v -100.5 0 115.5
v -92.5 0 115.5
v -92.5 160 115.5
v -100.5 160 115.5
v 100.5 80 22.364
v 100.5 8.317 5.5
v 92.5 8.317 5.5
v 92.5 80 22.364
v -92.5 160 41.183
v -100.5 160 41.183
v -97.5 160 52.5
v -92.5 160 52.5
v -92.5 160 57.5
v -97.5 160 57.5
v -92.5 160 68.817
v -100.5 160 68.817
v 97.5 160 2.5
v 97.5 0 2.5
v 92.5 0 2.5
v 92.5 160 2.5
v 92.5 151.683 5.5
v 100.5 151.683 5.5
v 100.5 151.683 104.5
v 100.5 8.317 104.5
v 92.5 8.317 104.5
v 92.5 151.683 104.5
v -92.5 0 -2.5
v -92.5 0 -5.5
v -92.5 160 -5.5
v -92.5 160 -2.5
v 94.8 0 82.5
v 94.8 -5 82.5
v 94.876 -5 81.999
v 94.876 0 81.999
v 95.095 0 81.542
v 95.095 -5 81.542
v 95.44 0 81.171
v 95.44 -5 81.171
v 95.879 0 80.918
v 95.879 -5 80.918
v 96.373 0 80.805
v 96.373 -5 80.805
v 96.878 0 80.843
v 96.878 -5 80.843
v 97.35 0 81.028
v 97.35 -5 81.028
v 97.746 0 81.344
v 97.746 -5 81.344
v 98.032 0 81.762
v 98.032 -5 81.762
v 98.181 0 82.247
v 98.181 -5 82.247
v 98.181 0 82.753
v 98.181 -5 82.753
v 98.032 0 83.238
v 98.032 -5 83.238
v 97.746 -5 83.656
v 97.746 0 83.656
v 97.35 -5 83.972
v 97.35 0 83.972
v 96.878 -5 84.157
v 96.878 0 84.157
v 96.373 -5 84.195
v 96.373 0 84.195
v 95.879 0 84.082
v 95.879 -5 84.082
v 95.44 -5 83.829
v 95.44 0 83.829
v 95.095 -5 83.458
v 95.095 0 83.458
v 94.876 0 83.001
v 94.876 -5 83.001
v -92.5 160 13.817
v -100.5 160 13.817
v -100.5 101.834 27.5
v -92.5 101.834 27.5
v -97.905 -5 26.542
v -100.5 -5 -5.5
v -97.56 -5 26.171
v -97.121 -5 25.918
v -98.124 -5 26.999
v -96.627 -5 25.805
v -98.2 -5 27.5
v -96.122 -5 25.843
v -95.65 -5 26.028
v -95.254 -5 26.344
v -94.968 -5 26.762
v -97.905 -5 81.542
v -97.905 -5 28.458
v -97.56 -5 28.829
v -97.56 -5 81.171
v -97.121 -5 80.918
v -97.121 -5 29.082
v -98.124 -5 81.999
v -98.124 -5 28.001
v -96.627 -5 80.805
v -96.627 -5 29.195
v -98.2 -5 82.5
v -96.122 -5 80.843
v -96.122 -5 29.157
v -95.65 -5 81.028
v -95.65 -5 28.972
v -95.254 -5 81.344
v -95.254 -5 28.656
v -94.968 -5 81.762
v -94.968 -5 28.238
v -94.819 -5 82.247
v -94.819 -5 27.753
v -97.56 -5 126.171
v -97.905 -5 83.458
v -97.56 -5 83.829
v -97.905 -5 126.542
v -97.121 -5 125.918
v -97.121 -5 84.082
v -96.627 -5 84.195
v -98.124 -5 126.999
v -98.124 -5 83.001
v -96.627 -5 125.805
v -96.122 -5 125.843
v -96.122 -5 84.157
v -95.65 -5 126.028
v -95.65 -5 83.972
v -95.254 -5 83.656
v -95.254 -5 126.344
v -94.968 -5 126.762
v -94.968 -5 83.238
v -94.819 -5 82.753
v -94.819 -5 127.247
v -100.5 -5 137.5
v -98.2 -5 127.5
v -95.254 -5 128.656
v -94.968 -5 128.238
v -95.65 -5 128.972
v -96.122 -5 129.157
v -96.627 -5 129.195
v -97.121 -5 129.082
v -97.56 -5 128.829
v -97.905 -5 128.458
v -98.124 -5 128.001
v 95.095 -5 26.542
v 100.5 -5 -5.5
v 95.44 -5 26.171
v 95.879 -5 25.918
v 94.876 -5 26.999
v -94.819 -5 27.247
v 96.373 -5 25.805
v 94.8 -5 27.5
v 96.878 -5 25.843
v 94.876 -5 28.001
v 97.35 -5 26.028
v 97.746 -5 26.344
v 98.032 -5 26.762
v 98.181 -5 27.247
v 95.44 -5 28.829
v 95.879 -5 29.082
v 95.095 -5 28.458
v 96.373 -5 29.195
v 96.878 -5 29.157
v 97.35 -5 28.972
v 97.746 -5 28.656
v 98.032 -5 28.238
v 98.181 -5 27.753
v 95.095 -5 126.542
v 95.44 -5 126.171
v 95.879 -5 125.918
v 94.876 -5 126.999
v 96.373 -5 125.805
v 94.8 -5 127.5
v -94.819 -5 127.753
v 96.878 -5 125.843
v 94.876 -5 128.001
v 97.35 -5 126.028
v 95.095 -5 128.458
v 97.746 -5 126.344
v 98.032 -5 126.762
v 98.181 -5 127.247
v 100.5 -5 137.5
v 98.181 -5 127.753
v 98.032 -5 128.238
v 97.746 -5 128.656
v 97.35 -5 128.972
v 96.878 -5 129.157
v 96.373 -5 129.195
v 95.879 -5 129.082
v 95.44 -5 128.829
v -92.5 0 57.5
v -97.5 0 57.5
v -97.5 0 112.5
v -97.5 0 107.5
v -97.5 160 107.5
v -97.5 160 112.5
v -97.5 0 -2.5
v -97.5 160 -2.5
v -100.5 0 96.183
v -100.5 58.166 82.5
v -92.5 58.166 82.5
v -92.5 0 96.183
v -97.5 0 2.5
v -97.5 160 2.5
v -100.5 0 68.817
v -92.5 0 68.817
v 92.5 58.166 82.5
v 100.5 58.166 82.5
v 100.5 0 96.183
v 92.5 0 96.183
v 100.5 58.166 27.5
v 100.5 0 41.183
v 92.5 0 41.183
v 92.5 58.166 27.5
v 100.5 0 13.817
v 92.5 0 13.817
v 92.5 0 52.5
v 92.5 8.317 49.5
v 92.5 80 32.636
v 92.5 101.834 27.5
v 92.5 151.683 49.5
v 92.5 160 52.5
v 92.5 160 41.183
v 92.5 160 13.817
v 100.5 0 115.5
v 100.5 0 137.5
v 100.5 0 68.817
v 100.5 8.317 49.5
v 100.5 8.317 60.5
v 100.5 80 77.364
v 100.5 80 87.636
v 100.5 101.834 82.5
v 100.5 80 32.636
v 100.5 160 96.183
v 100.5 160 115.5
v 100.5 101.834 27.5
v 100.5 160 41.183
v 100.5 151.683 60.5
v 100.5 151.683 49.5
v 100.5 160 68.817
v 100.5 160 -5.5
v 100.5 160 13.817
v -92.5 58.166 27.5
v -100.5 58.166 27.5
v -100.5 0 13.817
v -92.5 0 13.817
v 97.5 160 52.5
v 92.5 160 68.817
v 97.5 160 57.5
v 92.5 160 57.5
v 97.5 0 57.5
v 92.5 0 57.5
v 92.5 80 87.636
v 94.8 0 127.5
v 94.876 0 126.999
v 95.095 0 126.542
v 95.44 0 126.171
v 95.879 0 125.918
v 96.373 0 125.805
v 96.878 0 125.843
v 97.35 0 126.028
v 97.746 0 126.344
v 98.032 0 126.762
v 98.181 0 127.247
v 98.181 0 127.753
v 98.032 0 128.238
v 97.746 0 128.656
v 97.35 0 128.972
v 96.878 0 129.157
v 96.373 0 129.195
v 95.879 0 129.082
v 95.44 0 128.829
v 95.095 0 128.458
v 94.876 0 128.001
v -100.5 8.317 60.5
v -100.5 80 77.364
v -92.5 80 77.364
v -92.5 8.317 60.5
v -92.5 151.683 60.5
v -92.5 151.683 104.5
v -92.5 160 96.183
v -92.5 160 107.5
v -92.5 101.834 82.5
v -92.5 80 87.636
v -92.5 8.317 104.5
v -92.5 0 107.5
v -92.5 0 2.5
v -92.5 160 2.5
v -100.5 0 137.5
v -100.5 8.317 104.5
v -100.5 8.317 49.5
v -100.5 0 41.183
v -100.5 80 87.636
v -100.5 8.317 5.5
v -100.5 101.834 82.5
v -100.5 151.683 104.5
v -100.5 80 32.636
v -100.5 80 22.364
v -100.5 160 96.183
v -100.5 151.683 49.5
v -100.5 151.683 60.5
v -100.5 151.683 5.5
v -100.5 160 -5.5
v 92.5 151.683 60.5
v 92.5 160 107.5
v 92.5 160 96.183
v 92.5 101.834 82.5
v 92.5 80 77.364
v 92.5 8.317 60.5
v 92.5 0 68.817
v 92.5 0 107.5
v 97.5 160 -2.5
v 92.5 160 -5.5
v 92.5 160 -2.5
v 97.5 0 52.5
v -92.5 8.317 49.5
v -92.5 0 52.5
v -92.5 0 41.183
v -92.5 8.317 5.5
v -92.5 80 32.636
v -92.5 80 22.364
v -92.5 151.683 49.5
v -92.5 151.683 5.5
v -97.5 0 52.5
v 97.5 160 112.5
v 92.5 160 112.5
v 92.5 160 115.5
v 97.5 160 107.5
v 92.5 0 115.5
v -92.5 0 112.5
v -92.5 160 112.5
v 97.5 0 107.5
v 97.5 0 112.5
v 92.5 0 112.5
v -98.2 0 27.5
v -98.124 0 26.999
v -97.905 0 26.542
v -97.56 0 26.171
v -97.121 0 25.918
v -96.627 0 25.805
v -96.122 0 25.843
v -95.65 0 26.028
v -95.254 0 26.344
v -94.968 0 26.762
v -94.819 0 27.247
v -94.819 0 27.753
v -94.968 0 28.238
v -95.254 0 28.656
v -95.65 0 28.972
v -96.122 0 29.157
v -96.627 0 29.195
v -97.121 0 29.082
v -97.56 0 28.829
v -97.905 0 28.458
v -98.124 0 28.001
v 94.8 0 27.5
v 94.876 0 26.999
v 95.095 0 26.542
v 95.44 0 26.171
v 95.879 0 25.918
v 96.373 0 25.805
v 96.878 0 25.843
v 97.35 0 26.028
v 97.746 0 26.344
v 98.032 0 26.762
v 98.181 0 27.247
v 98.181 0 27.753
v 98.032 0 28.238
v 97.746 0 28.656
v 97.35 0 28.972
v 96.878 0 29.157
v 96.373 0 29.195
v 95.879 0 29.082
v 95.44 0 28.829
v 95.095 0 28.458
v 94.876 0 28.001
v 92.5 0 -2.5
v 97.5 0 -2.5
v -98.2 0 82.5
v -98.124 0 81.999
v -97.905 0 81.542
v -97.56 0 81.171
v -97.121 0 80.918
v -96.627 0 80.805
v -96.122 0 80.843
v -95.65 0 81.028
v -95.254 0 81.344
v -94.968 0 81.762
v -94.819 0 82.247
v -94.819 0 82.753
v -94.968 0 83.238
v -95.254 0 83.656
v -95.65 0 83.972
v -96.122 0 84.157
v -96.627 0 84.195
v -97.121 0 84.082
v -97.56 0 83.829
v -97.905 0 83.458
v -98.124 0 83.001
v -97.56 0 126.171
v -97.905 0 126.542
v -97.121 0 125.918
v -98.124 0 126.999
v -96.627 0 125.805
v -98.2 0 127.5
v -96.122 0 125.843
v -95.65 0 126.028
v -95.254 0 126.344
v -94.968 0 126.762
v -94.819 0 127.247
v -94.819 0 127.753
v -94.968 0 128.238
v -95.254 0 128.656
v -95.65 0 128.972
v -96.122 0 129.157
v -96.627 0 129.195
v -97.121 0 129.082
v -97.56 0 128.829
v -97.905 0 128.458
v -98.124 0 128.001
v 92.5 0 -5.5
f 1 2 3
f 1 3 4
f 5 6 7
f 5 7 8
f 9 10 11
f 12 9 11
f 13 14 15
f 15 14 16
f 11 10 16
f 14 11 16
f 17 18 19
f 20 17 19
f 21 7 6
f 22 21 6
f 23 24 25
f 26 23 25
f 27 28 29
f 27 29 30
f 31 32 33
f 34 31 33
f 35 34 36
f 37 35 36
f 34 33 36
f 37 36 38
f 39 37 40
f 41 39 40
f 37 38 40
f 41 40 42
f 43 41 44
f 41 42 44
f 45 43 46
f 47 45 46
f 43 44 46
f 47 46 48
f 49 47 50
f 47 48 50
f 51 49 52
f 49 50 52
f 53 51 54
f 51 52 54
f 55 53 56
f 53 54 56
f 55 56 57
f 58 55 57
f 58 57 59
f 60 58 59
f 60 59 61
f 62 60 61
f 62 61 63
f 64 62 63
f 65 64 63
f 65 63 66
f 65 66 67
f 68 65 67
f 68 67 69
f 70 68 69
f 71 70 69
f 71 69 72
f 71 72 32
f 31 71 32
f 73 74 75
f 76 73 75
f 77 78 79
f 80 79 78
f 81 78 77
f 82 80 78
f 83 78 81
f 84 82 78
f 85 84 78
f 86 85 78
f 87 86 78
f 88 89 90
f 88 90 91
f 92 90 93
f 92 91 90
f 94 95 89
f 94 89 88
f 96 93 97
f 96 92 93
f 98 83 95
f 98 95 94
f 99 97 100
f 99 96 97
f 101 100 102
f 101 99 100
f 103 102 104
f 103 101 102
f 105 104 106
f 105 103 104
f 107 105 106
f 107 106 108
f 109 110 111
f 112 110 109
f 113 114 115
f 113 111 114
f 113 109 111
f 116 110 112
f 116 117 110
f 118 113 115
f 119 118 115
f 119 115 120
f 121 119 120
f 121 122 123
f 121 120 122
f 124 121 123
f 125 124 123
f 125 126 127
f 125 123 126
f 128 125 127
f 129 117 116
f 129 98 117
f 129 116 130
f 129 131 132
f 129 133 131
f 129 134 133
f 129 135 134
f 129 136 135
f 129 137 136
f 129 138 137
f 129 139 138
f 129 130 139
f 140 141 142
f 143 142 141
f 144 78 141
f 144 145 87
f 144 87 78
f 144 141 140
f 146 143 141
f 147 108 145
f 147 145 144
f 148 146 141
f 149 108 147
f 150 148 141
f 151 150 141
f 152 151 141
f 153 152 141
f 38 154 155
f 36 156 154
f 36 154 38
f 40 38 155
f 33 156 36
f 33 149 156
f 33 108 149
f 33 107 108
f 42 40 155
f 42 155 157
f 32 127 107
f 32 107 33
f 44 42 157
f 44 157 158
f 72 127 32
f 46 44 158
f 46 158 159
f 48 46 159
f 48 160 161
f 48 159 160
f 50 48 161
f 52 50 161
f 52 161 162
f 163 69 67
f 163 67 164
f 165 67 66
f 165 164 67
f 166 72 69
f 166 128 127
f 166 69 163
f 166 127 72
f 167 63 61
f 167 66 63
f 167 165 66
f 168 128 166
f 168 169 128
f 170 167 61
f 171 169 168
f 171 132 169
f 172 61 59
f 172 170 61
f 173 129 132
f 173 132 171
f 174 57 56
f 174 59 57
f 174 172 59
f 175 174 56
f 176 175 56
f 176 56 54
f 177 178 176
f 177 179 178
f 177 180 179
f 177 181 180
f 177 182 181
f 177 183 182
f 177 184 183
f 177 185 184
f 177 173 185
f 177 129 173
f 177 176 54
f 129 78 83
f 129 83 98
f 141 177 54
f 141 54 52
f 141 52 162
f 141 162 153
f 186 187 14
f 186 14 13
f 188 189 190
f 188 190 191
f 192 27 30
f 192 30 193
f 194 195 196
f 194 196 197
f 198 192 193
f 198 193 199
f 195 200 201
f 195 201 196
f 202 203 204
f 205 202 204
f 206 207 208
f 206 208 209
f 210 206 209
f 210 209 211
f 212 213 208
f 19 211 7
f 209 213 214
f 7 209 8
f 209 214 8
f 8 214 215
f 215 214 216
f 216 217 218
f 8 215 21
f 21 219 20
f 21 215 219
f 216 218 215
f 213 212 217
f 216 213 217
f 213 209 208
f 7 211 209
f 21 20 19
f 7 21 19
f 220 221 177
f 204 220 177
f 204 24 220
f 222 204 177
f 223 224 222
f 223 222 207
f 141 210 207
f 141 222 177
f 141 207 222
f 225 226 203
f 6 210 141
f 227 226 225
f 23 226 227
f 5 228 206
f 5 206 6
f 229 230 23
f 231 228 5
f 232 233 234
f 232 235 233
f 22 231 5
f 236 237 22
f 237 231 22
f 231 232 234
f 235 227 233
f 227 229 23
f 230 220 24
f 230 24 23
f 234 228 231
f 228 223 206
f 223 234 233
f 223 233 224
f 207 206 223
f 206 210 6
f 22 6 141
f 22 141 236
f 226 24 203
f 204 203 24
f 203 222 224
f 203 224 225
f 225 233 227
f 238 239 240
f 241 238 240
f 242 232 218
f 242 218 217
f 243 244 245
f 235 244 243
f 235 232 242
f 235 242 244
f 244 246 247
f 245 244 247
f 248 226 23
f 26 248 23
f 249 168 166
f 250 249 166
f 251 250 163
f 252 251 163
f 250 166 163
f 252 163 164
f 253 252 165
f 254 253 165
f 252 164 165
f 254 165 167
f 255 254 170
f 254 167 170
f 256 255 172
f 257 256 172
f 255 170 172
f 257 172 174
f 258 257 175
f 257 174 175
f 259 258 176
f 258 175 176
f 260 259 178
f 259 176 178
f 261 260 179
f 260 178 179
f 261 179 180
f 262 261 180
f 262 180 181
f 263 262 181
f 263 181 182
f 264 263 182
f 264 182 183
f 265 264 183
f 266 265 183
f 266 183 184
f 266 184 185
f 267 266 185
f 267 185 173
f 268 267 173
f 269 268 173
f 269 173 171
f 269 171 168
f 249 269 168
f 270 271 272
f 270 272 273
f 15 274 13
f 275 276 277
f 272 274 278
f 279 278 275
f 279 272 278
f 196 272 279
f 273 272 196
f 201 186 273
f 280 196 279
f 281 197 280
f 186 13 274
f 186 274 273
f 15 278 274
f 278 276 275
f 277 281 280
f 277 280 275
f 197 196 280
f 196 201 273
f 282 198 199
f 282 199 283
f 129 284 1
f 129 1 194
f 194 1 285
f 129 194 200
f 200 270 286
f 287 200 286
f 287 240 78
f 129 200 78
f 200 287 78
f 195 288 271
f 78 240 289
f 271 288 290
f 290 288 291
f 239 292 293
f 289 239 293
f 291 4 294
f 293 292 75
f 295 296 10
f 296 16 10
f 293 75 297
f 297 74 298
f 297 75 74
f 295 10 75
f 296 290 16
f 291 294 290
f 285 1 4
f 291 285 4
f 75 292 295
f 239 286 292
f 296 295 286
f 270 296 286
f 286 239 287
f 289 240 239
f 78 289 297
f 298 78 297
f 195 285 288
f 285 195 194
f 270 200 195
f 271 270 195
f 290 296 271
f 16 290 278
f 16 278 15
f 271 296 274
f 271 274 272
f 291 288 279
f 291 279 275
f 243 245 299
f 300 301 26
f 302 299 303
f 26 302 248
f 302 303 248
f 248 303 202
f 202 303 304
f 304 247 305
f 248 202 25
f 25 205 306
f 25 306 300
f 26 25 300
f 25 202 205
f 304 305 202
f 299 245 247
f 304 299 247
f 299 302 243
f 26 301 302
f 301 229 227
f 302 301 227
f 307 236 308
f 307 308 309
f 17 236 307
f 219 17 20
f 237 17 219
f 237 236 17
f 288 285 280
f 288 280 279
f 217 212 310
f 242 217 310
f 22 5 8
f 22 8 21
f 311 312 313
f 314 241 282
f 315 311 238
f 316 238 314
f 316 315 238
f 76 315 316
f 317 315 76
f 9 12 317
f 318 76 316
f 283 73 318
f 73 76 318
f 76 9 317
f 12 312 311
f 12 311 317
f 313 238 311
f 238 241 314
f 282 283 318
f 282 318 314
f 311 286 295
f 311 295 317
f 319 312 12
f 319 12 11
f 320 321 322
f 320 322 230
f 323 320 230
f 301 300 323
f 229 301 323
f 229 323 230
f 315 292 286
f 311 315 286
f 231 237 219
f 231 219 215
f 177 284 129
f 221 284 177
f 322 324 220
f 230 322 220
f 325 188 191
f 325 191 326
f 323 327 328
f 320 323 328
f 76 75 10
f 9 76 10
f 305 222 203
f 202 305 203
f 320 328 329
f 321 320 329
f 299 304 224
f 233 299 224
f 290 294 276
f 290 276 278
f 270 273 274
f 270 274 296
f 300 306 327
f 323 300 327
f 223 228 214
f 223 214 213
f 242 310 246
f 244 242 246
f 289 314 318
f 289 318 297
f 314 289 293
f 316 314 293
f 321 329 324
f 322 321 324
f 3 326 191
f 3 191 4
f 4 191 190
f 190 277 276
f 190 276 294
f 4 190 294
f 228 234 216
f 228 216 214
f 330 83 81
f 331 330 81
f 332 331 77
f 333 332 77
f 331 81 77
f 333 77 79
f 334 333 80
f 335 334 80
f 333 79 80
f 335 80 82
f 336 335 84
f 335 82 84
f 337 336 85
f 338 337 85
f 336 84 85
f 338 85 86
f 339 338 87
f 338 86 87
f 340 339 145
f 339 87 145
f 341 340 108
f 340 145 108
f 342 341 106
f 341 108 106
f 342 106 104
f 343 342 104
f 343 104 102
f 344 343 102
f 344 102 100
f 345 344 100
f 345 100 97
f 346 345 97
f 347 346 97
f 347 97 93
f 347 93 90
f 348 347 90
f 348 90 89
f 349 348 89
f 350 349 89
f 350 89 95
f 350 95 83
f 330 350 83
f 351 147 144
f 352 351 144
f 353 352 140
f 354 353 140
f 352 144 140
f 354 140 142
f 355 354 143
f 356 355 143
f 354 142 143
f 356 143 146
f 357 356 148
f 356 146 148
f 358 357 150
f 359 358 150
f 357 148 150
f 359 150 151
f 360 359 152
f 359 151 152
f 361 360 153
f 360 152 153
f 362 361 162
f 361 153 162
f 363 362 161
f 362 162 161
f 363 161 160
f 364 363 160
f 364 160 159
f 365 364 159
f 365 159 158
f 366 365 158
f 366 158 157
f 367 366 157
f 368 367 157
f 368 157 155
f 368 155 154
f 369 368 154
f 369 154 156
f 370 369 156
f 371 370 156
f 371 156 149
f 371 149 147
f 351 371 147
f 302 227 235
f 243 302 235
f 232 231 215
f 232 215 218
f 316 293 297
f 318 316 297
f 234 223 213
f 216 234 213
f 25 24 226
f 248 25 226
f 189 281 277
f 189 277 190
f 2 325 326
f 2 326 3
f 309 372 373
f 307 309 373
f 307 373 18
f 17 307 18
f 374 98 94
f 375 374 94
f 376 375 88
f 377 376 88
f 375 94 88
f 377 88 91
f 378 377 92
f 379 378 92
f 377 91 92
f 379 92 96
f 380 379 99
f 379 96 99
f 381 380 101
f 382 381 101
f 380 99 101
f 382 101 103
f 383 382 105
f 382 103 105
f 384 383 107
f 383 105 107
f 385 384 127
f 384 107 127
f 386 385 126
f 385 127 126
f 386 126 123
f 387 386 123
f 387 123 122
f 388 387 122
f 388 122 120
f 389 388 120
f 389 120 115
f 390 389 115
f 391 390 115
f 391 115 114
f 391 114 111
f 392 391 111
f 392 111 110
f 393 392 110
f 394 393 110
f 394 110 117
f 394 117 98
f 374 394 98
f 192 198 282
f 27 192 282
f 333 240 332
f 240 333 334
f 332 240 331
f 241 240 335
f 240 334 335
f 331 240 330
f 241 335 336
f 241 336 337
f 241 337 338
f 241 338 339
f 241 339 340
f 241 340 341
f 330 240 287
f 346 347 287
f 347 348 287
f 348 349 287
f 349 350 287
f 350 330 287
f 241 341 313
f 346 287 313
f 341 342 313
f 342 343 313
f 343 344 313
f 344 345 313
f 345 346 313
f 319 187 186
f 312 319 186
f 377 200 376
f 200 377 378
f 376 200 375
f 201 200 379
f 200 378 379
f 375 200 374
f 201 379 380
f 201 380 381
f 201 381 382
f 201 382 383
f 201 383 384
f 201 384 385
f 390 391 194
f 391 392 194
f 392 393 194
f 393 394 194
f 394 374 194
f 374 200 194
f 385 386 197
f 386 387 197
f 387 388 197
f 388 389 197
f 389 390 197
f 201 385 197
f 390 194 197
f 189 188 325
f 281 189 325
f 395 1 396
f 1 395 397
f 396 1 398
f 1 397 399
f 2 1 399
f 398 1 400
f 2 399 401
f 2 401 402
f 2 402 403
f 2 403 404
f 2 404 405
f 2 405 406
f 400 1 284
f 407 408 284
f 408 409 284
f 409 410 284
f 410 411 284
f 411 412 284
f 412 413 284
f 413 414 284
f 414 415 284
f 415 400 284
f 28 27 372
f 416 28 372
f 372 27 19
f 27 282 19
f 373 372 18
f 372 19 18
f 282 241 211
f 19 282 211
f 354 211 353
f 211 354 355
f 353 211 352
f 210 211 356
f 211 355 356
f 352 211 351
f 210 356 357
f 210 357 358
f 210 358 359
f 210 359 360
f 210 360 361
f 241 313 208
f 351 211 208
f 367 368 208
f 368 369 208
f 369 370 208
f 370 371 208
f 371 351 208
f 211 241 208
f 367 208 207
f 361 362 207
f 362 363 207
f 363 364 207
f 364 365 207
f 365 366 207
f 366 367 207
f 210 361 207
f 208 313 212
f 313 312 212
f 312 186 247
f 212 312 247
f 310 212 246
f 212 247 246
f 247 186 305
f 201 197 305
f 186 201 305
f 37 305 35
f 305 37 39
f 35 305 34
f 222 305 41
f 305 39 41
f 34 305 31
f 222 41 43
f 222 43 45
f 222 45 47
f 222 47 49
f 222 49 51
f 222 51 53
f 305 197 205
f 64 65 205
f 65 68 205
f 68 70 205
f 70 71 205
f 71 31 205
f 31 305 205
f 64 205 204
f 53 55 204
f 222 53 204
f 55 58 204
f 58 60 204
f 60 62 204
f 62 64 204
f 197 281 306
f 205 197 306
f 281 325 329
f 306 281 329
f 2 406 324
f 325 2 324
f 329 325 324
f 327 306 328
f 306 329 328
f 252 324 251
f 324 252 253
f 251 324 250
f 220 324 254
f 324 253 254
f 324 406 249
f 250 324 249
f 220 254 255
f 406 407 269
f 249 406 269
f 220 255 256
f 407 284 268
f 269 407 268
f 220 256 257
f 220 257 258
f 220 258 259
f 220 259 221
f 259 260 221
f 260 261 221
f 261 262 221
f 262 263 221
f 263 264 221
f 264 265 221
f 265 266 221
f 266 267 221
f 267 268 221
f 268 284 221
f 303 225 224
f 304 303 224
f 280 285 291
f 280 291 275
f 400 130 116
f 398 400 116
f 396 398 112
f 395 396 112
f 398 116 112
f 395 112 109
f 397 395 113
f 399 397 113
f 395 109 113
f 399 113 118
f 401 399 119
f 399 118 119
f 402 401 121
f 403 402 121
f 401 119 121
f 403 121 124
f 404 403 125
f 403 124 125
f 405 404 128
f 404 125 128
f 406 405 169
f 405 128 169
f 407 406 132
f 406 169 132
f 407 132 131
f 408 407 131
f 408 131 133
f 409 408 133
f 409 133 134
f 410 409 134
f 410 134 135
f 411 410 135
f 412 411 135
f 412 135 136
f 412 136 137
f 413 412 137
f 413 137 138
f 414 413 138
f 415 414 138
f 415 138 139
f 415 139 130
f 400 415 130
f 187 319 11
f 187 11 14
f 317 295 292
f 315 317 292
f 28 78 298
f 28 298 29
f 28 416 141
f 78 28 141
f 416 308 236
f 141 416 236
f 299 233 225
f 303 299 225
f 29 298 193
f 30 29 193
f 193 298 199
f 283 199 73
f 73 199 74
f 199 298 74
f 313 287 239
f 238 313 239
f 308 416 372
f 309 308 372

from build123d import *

# Parameters (mm, degrees)
BOSS_EXTRUDE1_DEPTH      = 160
BOSS_EXTRUDE1_2_DEPTH    = 160
LPATTERN1_COUNT          = 3
LPATTERN1_PITCH          = 55
SKETCH2_W                = 201
SKETCH2_H                = 143
BOSS_EXTRUDE2_DEPTH      = 5
BOSS_EXTRUDE3_DEPTH      = 8
M3_CLEARANCE_HOLE1_D     = 3.4
M3_CLEARANCE_HOLE1_DEPTH = 5


with BuildPart() as part:
    # Sketch1 → Boss-Extrude1 (new body)
    with BuildSketch(Plane(origin=(0, 0, 0), x_dir=(1, 0, 0), z_dir=(0, 1, 0))):
        Polygon((-100.5, 5.5), (-92.5, 5.5), (-92.5, 2.5), (-97.5, 2.5), (-97.5, -2.5), (-92.5, -2.5), (-92.5, -5.5), (-100.5, -5.5), align=None)
    boss_extrude1 = extrude(amount=BOSS_EXTRUDE1_DEPTH)



with BuildPart() as body_2:
    # Sketch1 → Boss-Extrude1 2 (new body)
    with BuildSketch(Plane(origin=(0, 0, 0), x_dir=(1, 0, 0), z_dir=(0, 1, 0))):
        Polygon((100.5, -5.5), (100.5, 5.5), (92.5, 5.5), (92.5, 2.5), (97.5, 2.5), (97.5, -2.5), (92.5, -2.5), (92.5, -5.5), align=None)
    boss_extrude1_2 = extrude(amount=BOSS_EXTRUDE1_2_DEPTH)


with BuildPart() as lpattern1_1:
    # LPattern1: pattern copy
    add(boss_extrude1.moved(Location(Vector(0, 0, 1) * (1 * LPATTERN1_PITCH))))


with BuildPart() as lpattern1_2:
    # LPattern1: pattern copy
    add(boss_extrude1.moved(Location(Vector(0, 0, 1) * (2 * LPATTERN1_PITCH))))


with BuildPart() as lpattern1_3:
    # LPattern1: pattern copy
    add(boss_extrude1_2.moved(Location(Vector(0, 0, 1) * (1 * LPATTERN1_PITCH))))


with BuildPart() as lpattern1_4:
    # LPattern1: pattern copy
    add(boss_extrude1_2.moved(Location(Vector(0, 0, 1) * (2 * LPATTERN1_PITCH))))


with BuildPart() as part_1:
    add(part.part)

    add(body_2.part)  # Boss-Extrude2 merges body 2

    add(lpattern1_1.part)  # Boss-Extrude2 merges LPattern1_1

    add(lpattern1_2.part)  # Boss-Extrude2 merges LPattern1_2

    add(lpattern1_3.part)  # Boss-Extrude2 merges LPattern1_3

    add(lpattern1_4.part)  # Boss-Extrude2 merges LPattern1_4
    # Sketch2 → Boss-Extrude2 (add)
    with BuildSketch(Plane.XZ):
        with Locations((0, 66)):
            Rectangle(SKETCH2_W, SKETCH2_H)
    extrude(amount=BOSS_EXTRUDE2_DEPTH)

    # Sketch3 → Boss-Extrude3 (add)
    with BuildSketch(Plane.ZY.offset(100.5)):
        Polygon((5.5, 160), (13.816526412, 160), (27.5, 101.834227561), (41.183473588, 160), (49.5, 160), (49.5, 151.683473588), (32.636492883, 80), (49.5, 8.316526412), (49.5, 0), (41.183473588, 0), (27.5, 58.165772439), (13.816526412, 0), (5.5, 0), (5.5, 8.316526412), (22.363507117, 80), (5.5, 151.683473588), align=None)
        Polygon((104.5, 151.683473588), (104.5, 160), (96.183473588, 160), (82.5, 101.834227561), (68.816526412, 160), (60.5, 160), (60.5, 151.683473588), (77.363507117, 80), (60.5, 8.316526412), (60.5, 0), (68.816526412, 0), (82.5, 58.165772439), (96.183473588, 0), (104.5, 0), (104.5, 8.316526412), (87.636492883, 80), align=None)
    boss_extrude3 = extrude(amount=-BOSS_EXTRUDE3_DEPTH)

    # Mirror1: Boss-Extrude3 across plane
    add(boss_extrude3.mirror(Plane(origin=(0, 0, 0), x_dir=(0, 0, 1), z_dir=(1, 0, 0))))

    # M3 Clearance Hole1
    with Locations(Plane(origin=(0, 0, 0), x_dir=(1, 0, 0), z_dir=(0, 1, 0))):
        with Locations((-96.5, -27.5), (-96.5, -82.5), (96.5, -82.5), (96.5, -27.5), (-96.5, -127.5), (96.5, -127.5)):
            Hole(M3_CLEARANCE_HOLE1_D / 2, depth=M3_CLEARANCE_HOLE1_DEPTH)


solid = part_1.part
